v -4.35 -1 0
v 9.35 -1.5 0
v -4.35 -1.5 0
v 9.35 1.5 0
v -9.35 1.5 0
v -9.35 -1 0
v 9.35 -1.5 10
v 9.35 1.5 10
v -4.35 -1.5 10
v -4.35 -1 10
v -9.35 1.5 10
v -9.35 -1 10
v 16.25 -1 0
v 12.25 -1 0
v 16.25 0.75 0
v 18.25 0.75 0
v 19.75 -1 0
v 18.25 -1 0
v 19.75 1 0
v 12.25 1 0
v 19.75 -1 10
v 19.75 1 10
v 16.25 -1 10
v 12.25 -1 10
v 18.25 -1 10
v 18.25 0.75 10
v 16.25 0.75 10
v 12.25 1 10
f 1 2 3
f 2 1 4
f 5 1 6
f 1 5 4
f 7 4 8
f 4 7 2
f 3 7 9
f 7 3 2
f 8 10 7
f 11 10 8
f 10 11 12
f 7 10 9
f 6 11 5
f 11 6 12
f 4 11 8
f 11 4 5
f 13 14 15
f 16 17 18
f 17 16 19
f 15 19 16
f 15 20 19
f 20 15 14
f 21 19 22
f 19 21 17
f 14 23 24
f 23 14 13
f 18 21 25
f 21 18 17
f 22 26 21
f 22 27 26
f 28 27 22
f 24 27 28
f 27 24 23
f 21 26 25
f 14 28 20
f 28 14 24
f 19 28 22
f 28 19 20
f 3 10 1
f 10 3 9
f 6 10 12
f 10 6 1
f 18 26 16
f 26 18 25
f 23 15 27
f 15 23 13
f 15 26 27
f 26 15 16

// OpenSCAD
// Built by bench/smallmodels/features/compiler.py from a list of features.
$fn = 64;
difference() {
  union() {
    translate([0, 0, 0]) linear_extrude(height = 10) polygon([[-9.35, -1.5], [9.35, -1.5], [9.35, 1.5], [-9.35, 1.5]]);
    translate([15, 0, 0]) linear_extrude(height = 10) polygon([[-2.75, -1], [4.75, -1], [4.75, 1], [-2.75, 1]]);
  }
  union() {
    translate([-9.35, -4, 0]) rotate([0, 0, 0]) translate([-5, -3, 0]) cube([10, 6, 10]);
    translate([17.25, -2.25, 0]) rotate([0, 0, 0]) translate([-1, -3, 0]) cube([2, 6, 10]);
  }
}
